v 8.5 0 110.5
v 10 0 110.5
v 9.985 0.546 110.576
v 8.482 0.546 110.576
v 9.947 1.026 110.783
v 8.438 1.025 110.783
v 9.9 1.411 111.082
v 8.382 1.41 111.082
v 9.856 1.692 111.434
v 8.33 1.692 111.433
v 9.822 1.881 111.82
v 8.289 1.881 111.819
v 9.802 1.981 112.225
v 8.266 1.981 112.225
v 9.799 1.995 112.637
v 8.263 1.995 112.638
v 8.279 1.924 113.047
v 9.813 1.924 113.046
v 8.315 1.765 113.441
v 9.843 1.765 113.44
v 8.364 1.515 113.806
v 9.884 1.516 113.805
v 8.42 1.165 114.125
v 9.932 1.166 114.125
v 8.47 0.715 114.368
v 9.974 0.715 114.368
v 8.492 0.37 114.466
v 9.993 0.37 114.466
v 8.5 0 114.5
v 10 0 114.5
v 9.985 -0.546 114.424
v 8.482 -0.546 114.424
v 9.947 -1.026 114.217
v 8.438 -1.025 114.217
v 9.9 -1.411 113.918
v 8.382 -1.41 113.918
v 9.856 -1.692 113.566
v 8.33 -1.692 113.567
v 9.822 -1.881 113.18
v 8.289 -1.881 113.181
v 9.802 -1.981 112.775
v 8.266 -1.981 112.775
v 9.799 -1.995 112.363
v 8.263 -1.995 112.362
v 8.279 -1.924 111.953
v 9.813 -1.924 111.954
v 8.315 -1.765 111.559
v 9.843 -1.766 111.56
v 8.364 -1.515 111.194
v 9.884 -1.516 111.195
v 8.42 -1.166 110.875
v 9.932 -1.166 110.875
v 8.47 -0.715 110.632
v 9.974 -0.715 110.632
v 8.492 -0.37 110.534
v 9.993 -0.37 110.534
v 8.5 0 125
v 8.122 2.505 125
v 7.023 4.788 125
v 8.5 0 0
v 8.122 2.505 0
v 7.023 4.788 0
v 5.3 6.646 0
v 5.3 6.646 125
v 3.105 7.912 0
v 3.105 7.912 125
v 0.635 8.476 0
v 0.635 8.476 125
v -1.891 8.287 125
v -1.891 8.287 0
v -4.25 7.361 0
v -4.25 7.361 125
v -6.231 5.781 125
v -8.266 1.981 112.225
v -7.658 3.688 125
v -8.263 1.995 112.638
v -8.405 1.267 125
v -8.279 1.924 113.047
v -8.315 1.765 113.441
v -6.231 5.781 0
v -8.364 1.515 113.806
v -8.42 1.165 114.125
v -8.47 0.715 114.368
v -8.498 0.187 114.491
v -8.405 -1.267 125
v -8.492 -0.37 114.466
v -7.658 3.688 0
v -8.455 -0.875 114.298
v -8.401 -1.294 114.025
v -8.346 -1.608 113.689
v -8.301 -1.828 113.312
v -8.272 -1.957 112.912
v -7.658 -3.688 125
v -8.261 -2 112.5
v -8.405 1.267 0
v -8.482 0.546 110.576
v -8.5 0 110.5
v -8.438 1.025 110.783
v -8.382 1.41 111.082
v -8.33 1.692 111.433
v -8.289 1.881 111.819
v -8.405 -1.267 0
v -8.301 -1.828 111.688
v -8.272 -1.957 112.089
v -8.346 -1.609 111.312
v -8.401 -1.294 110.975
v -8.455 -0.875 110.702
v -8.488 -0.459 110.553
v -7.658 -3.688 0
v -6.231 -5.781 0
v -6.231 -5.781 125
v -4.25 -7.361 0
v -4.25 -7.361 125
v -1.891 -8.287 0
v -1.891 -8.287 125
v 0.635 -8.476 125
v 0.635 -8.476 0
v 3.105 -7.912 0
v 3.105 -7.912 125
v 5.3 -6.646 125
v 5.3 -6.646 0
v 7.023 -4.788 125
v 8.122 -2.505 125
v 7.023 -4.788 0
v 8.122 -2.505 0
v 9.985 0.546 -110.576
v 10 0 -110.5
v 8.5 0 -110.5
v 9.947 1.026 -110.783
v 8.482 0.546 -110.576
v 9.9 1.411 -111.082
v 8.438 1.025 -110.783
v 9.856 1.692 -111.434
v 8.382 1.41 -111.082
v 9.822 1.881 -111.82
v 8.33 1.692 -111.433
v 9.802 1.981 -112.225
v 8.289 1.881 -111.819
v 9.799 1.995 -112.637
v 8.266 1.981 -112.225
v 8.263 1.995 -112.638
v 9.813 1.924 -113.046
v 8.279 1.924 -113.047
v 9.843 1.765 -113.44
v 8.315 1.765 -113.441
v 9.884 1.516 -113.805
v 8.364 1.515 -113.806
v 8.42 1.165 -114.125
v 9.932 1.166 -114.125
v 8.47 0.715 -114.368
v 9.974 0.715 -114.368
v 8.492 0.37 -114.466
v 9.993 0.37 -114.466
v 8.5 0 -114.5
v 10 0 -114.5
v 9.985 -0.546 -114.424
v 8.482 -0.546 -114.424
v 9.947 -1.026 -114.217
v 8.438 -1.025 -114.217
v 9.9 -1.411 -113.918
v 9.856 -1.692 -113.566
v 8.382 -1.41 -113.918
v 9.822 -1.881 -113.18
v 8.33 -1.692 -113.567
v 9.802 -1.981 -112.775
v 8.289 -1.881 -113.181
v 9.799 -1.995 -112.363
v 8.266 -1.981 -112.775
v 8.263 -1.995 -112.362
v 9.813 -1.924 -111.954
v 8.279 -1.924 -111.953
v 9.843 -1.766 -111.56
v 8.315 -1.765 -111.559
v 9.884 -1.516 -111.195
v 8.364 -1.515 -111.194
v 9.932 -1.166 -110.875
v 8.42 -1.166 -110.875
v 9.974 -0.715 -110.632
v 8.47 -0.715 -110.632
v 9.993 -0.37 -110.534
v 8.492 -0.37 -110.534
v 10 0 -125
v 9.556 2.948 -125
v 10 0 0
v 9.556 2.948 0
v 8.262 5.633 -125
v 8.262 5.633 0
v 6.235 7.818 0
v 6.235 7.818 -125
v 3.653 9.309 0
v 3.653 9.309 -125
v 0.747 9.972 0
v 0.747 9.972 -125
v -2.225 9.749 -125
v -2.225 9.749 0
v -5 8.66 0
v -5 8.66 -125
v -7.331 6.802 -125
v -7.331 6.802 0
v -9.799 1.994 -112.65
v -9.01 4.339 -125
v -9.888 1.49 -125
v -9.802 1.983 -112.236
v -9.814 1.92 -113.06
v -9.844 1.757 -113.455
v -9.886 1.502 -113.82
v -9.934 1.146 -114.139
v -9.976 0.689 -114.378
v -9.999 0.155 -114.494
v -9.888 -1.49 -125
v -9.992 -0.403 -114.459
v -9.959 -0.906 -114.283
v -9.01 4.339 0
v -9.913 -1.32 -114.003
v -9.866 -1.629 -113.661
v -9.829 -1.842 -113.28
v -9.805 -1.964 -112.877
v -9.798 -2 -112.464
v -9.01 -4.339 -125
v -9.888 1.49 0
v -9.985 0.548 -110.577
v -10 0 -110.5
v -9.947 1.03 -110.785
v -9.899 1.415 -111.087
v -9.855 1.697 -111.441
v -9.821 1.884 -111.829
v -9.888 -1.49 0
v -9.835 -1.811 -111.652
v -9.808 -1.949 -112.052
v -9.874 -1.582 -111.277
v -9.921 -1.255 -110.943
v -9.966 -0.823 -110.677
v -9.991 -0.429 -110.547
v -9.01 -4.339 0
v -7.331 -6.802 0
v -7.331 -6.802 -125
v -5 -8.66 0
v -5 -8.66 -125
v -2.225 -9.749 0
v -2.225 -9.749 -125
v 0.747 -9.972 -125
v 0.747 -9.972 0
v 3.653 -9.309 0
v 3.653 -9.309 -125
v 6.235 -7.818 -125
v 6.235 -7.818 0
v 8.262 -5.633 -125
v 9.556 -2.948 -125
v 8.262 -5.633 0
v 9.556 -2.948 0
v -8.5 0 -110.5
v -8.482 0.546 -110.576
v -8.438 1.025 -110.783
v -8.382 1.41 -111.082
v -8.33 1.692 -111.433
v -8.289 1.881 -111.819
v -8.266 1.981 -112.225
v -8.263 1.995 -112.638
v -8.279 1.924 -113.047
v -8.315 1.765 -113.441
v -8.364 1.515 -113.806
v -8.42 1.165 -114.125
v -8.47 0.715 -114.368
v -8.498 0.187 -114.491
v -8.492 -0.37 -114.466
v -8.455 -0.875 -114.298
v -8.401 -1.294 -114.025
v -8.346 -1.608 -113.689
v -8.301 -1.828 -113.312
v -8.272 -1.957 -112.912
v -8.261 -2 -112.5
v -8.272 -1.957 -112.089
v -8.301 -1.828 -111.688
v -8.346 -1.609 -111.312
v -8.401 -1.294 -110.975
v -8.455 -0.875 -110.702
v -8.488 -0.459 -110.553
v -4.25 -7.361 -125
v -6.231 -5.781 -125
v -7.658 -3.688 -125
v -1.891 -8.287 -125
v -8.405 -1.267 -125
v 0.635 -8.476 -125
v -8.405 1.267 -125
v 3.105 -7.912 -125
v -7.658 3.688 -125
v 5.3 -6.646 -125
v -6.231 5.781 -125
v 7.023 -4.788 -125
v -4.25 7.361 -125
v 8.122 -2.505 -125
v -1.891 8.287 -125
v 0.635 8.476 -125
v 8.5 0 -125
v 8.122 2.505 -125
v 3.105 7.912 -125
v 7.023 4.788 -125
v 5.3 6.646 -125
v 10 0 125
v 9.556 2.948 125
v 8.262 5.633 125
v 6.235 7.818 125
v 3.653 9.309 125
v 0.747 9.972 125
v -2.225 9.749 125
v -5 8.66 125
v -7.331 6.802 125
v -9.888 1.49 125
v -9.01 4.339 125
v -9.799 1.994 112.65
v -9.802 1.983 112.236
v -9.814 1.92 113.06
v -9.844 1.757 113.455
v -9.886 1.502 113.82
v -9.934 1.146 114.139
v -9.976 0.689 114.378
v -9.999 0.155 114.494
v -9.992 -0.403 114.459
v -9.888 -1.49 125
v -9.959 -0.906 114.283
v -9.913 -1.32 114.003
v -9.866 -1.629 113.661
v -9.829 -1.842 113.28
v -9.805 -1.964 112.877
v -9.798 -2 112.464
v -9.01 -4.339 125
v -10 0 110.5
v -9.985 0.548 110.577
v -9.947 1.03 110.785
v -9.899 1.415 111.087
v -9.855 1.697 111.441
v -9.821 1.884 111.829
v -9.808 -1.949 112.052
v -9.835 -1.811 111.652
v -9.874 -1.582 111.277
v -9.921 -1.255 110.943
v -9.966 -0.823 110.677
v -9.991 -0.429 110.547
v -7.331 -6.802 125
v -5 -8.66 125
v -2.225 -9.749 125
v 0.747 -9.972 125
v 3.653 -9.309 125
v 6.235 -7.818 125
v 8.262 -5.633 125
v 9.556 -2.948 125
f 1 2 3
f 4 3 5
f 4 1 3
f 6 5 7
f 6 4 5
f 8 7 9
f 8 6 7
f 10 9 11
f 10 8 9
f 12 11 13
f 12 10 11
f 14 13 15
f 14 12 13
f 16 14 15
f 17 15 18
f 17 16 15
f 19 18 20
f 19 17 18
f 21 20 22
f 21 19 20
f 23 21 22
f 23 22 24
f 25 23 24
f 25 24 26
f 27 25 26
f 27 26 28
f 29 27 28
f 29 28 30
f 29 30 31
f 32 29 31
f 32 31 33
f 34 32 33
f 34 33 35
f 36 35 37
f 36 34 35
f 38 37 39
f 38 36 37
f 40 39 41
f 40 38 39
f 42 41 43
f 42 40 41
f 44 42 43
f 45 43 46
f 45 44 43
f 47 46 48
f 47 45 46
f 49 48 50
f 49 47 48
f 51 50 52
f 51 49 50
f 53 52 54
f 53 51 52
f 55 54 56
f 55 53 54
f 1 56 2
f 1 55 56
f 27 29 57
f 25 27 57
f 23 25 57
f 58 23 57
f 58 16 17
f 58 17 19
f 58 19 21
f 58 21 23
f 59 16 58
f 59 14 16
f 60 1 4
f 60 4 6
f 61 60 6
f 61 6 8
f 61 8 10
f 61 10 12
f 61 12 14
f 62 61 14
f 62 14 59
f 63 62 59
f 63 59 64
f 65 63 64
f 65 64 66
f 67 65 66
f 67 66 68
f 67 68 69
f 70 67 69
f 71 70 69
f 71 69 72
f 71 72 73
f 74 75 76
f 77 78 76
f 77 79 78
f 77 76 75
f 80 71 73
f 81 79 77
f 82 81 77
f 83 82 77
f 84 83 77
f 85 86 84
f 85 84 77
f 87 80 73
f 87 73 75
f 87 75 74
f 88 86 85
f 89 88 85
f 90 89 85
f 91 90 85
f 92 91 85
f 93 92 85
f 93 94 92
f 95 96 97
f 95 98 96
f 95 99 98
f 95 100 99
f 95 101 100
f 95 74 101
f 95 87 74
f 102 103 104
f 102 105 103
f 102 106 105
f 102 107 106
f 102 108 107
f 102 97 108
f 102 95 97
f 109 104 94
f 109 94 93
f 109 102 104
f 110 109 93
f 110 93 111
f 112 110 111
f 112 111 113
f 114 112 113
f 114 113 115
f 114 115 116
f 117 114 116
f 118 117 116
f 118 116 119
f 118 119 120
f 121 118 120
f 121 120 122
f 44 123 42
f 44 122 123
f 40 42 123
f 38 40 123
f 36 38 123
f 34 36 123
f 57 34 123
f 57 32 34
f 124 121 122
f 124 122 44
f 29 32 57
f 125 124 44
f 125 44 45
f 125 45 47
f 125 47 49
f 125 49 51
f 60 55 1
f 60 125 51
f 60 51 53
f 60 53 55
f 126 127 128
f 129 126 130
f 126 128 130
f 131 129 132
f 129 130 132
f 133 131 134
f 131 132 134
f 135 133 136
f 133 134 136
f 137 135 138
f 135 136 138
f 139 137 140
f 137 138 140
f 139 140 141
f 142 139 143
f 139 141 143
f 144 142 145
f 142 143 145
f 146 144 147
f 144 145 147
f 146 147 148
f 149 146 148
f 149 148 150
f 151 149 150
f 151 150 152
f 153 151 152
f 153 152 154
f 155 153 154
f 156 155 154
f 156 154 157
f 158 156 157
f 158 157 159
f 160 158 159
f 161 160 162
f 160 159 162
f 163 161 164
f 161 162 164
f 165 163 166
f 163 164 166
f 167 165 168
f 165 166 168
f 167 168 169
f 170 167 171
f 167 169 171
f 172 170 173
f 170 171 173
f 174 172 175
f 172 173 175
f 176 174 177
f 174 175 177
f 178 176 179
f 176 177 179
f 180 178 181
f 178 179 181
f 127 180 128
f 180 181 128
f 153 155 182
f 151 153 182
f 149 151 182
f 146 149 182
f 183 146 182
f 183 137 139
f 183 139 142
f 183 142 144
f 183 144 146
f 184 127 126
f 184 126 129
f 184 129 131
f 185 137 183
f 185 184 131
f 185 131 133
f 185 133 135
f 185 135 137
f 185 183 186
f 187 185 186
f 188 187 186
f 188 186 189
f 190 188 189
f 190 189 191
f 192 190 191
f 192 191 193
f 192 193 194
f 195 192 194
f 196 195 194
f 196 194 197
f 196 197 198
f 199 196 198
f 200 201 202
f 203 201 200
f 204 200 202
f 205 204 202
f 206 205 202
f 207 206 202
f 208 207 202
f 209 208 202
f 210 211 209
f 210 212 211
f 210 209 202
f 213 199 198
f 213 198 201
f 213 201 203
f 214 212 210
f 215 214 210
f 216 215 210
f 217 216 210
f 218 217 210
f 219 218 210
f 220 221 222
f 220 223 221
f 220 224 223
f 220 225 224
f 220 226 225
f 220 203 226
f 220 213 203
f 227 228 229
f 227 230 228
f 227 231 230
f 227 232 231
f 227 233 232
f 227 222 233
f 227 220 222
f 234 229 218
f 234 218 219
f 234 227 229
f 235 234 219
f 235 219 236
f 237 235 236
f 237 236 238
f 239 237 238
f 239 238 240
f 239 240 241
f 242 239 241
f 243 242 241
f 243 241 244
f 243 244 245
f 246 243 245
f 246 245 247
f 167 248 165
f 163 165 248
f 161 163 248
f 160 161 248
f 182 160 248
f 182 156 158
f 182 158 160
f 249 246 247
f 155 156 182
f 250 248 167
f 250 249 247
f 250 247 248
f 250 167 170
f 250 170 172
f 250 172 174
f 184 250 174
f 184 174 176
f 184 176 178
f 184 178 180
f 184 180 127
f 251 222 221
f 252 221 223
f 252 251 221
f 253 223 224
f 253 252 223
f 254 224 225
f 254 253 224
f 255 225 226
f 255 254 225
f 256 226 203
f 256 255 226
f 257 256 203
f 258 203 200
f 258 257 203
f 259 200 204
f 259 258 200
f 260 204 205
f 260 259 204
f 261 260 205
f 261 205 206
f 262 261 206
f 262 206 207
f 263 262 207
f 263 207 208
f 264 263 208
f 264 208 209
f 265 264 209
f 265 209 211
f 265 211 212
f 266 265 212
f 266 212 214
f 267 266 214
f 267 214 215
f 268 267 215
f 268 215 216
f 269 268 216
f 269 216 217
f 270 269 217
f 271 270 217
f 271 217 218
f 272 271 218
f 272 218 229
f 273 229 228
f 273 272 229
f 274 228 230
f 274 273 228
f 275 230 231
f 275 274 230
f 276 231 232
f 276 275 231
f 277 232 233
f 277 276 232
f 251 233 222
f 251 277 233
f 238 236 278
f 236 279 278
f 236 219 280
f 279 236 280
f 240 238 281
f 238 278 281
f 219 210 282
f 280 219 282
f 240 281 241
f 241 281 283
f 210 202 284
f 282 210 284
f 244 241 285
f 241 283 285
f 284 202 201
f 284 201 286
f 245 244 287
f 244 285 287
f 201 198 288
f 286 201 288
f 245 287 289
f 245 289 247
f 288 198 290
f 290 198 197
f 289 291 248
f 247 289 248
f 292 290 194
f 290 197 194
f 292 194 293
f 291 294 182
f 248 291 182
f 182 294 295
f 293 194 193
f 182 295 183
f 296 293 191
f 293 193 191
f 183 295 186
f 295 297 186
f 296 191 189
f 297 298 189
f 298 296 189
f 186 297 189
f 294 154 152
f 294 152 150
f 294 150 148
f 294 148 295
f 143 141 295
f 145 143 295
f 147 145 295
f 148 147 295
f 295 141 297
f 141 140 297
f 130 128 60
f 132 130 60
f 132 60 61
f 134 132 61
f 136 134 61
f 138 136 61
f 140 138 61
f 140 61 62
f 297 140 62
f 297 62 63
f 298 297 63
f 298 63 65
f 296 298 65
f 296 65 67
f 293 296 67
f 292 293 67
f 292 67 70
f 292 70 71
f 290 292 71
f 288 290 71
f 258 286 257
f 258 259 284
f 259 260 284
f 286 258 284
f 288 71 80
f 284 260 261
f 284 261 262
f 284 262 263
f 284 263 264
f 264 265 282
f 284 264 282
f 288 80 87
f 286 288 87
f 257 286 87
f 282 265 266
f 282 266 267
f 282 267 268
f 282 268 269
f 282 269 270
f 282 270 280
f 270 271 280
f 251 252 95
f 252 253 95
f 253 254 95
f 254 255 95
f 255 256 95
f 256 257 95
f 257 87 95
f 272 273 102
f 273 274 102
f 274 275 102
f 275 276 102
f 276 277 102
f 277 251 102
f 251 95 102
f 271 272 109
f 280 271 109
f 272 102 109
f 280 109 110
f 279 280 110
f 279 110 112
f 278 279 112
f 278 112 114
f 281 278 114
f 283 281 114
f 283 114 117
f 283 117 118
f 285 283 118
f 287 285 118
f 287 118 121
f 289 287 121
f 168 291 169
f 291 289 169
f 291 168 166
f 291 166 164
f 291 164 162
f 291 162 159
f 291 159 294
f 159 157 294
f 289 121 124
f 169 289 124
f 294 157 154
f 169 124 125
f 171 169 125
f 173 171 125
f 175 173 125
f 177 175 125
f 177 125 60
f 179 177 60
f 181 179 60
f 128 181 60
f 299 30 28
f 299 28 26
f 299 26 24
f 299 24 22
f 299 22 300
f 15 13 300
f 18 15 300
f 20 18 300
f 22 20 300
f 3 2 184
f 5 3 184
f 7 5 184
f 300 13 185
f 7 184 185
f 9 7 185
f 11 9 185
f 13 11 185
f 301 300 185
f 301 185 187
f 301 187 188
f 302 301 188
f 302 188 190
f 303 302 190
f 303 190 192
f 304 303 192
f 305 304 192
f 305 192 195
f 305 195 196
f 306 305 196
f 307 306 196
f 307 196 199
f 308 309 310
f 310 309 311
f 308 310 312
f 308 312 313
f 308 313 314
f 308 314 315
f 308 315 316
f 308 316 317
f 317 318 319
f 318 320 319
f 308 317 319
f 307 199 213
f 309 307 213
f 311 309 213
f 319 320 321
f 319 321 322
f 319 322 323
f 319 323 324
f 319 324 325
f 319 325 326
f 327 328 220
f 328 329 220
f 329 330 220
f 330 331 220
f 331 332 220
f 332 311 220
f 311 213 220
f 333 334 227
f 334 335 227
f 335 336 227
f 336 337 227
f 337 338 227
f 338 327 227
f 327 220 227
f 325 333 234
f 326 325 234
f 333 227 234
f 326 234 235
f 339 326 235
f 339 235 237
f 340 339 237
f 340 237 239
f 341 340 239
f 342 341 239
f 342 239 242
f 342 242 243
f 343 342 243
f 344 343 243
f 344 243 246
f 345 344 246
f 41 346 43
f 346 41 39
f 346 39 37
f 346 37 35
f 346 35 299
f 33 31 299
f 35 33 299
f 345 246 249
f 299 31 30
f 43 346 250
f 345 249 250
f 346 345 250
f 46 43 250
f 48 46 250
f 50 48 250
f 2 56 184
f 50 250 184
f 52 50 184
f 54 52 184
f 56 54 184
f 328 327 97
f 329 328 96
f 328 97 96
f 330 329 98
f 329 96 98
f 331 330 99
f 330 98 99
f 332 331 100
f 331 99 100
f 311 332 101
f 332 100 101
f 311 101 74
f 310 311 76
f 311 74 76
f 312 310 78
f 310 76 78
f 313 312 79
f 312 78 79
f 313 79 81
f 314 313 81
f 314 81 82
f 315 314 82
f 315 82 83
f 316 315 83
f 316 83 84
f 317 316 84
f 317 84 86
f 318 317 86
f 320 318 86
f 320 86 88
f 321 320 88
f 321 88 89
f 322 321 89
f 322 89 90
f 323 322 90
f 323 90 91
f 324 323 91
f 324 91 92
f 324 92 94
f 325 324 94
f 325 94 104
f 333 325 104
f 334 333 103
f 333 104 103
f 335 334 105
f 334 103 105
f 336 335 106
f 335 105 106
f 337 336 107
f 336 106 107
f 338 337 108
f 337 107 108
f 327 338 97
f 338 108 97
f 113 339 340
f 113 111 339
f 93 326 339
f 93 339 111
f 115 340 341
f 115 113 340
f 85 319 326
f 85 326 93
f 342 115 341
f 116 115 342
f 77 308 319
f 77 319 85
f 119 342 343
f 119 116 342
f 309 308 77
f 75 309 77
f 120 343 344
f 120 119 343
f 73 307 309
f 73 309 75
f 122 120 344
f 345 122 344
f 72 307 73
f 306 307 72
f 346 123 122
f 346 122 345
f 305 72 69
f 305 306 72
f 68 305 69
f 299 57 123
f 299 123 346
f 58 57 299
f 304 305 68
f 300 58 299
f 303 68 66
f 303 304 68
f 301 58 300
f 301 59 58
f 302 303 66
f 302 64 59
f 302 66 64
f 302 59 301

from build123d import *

# Parameters (mm, degrees)
SKETCH1_R           = 10
SKETCH1_R_2         = 8.5
BOSS_EXTRUDE1_DEPTH = 125
SKETCH2_R           = 2
CUT_EXTRUDE1_DEPTH  = 126.797456254


with BuildPart() as part:
    # Sketch1 → Boss-Extrude1 (new body)
    with BuildSketch(Plane.XY):
        Circle(SKETCH1_R)
        Circle(SKETCH1_R_2, mode=Mode.SUBTRACT)
    boss_extrude1 = extrude(amount=BOSS_EXTRUDE1_DEPTH)

    # Sketch2 → Cut-Extrude1 (cut, symmetric)
    with BuildSketch(Plane(origin=(0, 0, 0), x_dir=(0, 0, -1), z_dir=(1, 0, 0))):
        with Locations((-112.5, 0)):
            Circle(SKETCH2_R)
        with Locations((-227.5, 0)):
            Circle(SKETCH2_R)
    cut_extrude1 = extrude(amount=CUT_EXTRUDE1_DEPTH, both=True, mode=Mode.SUBTRACT)

    # Mirror1: Boss-Extrude1, Cut-Extrude1 across plane
    add(boss_extrude1.mirror(Plane.XY))
    add(cut_extrude1.mirror(Plane.XY), mode=Mode.SUBTRACT)


solid = part.part
